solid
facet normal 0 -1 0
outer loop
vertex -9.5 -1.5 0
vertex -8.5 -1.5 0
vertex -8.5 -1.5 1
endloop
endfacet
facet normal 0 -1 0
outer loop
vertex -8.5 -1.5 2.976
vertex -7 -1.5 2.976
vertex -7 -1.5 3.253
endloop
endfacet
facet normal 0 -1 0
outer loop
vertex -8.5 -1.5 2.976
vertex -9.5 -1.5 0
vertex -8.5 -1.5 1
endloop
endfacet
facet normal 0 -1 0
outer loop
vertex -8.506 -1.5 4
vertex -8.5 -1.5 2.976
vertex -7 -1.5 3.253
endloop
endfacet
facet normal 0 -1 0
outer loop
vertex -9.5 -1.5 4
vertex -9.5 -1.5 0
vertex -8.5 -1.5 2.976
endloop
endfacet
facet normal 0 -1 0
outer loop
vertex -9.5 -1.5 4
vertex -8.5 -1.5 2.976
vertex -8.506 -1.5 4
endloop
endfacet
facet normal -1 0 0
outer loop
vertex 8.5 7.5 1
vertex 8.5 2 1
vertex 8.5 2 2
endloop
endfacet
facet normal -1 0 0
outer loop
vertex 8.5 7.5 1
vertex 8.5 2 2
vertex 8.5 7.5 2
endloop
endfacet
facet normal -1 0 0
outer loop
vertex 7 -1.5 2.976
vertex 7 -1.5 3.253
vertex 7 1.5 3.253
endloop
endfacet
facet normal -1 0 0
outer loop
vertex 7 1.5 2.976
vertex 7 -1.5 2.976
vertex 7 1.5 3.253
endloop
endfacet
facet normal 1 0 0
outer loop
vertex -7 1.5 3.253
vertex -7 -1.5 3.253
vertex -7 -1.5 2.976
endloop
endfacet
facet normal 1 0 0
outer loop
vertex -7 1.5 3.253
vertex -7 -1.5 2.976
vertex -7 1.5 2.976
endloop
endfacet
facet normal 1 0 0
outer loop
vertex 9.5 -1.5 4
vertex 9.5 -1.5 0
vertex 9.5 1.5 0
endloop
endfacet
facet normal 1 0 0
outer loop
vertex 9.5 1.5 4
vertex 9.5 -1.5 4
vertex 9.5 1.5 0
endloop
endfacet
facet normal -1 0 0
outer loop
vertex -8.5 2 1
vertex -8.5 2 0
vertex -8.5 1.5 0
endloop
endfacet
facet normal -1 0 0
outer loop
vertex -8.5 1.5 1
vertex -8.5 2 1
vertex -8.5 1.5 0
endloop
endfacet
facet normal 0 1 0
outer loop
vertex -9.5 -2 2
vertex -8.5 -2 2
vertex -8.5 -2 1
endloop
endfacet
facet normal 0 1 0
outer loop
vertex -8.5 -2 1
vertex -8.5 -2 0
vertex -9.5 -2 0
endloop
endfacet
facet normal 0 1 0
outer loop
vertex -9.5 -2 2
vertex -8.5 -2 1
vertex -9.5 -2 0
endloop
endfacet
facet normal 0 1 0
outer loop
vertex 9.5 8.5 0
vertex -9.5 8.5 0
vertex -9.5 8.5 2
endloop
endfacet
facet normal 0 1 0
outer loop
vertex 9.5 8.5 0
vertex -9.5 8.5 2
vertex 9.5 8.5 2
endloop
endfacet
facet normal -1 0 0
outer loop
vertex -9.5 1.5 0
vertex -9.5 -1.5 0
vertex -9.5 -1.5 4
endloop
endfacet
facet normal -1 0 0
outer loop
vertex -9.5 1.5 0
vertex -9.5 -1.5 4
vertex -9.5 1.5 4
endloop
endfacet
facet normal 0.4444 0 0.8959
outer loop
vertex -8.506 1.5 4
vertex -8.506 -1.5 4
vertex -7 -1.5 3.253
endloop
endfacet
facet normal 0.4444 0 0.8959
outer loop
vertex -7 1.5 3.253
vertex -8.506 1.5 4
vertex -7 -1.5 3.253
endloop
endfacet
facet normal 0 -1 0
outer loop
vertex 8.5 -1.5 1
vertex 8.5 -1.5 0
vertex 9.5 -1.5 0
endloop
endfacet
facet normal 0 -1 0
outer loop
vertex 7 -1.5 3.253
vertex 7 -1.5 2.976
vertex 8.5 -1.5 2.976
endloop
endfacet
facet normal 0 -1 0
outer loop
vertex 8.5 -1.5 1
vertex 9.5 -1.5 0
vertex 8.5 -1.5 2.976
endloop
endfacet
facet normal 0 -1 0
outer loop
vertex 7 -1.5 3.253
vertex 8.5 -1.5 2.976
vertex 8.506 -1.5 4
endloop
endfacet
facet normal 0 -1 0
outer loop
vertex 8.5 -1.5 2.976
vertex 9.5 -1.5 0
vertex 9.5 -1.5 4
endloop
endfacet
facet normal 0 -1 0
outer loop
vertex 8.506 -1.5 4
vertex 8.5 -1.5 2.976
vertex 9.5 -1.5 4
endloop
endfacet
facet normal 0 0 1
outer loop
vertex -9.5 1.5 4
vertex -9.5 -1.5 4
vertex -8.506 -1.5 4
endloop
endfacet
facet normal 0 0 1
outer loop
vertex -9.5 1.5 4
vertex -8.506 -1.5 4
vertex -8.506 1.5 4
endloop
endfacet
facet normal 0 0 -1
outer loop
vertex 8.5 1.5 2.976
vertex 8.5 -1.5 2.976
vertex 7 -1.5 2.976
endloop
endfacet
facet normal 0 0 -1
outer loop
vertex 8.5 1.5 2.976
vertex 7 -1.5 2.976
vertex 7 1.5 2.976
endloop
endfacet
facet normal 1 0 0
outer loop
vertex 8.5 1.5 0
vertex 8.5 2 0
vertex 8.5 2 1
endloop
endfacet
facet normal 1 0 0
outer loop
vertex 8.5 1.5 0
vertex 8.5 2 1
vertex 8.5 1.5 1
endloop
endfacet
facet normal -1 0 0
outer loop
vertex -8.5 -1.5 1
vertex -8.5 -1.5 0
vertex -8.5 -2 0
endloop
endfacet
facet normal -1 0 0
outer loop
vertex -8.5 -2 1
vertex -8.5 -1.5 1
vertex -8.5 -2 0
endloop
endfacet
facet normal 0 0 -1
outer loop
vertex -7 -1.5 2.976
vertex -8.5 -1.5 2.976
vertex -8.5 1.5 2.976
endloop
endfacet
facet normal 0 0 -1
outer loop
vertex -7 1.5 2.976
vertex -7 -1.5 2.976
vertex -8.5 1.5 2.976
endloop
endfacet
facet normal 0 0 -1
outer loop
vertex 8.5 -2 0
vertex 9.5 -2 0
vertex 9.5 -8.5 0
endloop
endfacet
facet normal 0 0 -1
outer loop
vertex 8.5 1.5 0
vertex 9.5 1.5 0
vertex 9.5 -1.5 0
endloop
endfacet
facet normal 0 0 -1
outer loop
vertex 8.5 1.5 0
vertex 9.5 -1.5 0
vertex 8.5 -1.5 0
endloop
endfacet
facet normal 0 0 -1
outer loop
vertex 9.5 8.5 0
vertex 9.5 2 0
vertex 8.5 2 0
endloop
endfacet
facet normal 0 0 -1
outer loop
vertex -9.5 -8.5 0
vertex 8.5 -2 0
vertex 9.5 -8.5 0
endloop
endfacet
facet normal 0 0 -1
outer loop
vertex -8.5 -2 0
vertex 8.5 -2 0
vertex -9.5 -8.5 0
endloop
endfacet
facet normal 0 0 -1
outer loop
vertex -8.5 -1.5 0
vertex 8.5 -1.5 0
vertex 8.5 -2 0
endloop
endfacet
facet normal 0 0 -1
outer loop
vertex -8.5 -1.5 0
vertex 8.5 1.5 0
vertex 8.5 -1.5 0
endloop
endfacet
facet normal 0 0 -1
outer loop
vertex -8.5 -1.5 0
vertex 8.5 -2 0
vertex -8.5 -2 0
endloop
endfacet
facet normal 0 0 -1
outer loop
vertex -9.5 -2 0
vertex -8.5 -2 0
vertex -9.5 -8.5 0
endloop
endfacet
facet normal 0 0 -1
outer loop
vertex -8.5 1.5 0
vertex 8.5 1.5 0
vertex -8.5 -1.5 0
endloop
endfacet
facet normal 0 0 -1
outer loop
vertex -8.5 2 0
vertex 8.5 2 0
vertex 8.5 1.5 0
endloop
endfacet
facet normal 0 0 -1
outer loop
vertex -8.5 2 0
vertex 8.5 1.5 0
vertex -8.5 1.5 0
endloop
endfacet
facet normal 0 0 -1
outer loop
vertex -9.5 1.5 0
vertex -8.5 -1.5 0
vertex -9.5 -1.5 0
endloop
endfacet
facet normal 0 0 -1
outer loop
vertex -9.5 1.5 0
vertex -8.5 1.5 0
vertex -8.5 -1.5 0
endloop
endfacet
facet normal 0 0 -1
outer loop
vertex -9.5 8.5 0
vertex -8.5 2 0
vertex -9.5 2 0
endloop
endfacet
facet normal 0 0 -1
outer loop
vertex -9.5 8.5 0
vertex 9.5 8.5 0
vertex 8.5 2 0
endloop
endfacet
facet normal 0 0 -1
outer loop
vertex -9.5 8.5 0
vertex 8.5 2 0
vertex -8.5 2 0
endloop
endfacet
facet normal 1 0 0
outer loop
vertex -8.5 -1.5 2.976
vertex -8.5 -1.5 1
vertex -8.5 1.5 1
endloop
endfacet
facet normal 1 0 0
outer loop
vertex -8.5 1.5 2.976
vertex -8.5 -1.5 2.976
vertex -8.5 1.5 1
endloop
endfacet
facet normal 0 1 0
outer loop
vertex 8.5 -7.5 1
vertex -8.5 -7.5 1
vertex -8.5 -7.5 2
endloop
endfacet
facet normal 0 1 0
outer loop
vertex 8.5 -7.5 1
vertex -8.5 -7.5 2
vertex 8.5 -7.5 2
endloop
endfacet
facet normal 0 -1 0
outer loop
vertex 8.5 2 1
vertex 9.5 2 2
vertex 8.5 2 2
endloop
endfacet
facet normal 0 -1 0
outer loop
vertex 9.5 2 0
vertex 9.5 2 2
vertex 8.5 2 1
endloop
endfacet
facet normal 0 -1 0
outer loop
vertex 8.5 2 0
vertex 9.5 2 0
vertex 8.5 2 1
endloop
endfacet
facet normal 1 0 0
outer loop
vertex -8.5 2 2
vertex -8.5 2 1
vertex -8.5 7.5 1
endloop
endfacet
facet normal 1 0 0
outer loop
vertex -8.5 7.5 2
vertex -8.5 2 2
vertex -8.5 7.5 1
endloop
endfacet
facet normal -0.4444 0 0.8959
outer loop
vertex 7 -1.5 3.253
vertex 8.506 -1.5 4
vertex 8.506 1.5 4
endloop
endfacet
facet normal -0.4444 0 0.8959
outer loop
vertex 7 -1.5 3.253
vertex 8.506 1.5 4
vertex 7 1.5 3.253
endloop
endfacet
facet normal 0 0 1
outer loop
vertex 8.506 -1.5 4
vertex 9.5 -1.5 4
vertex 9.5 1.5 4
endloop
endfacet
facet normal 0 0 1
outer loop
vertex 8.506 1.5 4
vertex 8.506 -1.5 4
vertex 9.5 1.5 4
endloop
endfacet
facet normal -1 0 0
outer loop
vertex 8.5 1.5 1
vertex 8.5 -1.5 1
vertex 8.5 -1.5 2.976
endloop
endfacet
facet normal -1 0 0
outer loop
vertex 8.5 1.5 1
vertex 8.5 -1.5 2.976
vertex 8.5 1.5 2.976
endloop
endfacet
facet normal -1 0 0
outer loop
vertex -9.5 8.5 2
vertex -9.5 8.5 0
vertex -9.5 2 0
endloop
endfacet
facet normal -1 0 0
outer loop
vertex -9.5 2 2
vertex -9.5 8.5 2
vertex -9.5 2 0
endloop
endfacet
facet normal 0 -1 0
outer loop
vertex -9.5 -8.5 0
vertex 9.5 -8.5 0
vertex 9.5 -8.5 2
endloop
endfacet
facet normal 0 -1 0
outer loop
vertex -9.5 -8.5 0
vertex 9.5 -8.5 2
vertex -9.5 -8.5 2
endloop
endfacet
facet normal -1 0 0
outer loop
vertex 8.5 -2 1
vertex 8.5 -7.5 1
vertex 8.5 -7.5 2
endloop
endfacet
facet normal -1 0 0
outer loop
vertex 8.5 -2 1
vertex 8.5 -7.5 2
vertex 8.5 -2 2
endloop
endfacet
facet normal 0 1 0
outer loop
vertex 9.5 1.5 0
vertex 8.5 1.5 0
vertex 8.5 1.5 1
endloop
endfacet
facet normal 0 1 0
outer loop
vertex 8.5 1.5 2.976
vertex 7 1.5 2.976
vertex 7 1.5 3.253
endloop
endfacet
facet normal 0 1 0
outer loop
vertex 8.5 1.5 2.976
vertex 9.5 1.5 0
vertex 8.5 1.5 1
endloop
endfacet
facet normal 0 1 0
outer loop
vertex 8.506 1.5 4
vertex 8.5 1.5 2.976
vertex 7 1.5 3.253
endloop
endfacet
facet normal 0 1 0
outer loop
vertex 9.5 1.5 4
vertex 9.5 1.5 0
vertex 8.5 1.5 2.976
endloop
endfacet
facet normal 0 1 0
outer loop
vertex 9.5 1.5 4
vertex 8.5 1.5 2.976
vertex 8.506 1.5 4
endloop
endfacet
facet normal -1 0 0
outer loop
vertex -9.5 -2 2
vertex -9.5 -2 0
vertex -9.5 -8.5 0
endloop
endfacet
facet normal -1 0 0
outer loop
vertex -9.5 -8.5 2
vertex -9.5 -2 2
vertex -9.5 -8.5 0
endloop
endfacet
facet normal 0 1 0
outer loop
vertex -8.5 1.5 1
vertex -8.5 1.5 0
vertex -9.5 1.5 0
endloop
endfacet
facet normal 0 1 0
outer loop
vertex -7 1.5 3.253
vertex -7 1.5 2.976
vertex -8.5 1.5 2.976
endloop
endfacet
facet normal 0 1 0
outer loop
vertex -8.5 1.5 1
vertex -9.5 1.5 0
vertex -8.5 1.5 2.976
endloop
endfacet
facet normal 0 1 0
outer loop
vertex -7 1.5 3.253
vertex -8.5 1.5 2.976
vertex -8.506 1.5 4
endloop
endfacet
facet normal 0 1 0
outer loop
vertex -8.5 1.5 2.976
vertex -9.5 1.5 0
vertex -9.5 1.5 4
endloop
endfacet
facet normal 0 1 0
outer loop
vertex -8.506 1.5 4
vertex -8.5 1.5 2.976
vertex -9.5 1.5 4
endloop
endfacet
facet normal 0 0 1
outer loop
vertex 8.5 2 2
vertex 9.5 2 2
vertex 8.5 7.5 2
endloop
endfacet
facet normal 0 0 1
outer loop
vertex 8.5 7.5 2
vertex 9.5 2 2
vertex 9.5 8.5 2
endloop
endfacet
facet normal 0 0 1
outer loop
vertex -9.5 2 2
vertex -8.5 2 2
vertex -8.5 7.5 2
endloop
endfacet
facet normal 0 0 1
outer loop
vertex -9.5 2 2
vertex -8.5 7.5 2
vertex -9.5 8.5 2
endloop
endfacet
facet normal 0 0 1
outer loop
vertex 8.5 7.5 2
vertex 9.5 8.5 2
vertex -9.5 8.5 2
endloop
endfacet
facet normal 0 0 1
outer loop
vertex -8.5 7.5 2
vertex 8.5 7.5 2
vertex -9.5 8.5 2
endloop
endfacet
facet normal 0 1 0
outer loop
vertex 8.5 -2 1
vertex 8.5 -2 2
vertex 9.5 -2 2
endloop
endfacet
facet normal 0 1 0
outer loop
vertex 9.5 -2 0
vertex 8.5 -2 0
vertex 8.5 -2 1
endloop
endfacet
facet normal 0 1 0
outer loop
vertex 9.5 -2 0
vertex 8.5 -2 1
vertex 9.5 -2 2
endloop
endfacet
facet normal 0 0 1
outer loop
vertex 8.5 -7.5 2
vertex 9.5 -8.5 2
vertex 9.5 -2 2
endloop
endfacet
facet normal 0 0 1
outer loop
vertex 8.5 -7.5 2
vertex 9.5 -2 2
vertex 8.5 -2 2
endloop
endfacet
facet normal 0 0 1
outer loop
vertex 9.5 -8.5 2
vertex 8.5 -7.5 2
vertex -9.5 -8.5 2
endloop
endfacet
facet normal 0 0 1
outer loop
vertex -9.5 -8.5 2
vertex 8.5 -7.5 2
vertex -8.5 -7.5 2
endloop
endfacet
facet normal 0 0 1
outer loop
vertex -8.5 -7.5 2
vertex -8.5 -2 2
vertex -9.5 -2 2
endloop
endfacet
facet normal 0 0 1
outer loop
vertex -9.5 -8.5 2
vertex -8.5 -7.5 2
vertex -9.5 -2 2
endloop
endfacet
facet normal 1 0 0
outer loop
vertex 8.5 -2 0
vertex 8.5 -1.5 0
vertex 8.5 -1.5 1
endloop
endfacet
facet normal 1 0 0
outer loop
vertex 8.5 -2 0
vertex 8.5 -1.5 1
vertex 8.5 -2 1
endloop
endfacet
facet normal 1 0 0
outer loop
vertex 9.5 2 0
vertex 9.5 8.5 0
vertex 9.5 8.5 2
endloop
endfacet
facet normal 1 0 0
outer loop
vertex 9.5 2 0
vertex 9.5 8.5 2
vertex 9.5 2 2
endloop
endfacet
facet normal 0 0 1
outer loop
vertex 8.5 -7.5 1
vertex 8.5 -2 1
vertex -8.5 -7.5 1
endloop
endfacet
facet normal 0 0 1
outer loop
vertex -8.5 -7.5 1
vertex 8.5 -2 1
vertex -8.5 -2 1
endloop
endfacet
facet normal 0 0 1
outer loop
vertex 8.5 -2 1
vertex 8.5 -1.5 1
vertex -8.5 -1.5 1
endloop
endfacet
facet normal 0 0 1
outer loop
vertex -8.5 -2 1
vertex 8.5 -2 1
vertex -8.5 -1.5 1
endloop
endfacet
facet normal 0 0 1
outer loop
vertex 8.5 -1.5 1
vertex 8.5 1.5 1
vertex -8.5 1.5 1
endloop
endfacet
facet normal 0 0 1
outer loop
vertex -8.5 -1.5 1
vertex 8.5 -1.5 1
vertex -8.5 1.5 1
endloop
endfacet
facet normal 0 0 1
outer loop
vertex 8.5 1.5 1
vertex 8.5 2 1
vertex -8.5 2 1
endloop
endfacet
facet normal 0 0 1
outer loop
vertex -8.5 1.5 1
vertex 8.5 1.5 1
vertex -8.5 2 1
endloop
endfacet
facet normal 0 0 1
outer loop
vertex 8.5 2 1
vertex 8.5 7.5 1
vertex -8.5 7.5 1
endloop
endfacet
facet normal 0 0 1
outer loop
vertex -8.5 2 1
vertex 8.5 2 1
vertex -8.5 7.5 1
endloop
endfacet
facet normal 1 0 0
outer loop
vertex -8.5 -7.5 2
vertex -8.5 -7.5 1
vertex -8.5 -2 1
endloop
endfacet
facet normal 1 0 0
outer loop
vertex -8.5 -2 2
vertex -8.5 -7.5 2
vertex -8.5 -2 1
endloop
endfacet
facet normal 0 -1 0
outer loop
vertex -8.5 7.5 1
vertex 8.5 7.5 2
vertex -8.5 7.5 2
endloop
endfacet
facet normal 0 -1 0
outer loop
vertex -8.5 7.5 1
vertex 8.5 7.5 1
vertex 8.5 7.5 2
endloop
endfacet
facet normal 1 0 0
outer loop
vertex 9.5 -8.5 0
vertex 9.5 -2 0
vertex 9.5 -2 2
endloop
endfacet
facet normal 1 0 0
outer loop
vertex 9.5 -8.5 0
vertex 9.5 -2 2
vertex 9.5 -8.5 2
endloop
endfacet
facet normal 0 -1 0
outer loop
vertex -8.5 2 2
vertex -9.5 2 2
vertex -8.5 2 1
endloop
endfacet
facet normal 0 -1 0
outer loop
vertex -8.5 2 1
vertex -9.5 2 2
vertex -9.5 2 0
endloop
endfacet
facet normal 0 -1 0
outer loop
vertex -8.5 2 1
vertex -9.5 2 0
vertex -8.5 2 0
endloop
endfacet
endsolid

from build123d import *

# Parameters (mm, degrees)
F1_DEPTH  = 1
F2_DEPTH  = 2
F0_W      = 1
F0_H      = 3
F3_DEPTH  = 4
F4_W      = 3
F4_H      = 1.0236278605
F5_DEPTH  = 1.5
F7_DEPTH  = 3
F9_DEPTH  = 2
F10_W     = 8.5
F10_H     = 15
F11_DEPTH = 2


# Not quite as in the source:
# - a feature names something its author has since deleted; it is built from what else it names


with BuildPart() as f1:
    # F0 (on Top) → F1 (new body)
    with BuildSketch(Plane.XY):
        Polygon((-8.5, 7.5), (-8.5, 2), (-8.5, 1.5), (-8.5, -1.5), (-8.5, -2), (-8.5, -7.5), (8.5, -7.5), (8.5, 7.5), align=None)
    extrude(amount=F1_DEPTH)

    # F0 (on Top) → F2 (join)
    with BuildSketch(Plane.XY):
        Polygon((9.5, 8.5), (-9.5, 8.5), (-9.5, 2), (-8.5, 2), (-8.5, 7.5), (8.5, 7.5), (8.5, -7.5), (-8.5, -7.5), (-8.5, -2), (-9.5, -2), (-9.5, -8.5), (9.5, -8.5), align=None)
    extrude(amount=F2_DEPTH)

    # F0 (on Top) → F3 (join)
    with BuildSketch(Plane.XY):
        with Locations((-9, 0)):
            Rectangle(F0_W, F0_H)
    extrude(amount=F3_DEPTH)

    # F4 (on face) → F5 (join)
    with BuildSketch(Plane.YZ.offset(-8.5)):
        with Locations((0, 3.4881860698)):
            Rectangle(F4_W, F4_H)
    extrude(amount=F5_DEPTH)

    # F6 (on face) → F7 (cut)
    with BuildSketch(Plane.XZ.offset(1.5)):
        Polygon((-8.5056265816, 4), (-7, 3.2529253513), (-7, 4), align=None)
    extrude(amount=-F7_DEPTH, mode=Mode.SUBTRACT)

    # F8 (on face) → F9 (cut)
    with BuildSketch(Plane.XY.offset(2)):
        Polygon((9.5, 8.5), (0, 8.5), (0, 7.5), (8.5, 7.5), (8.5, -7.5), (0, -7.5), (0, -8.5), (9.5, -8.5), align=None)
    extrude(amount=-F9_DEPTH, mode=Mode.SUBTRACT)

    # F10 (on face) → F11 (cut)
    with BuildSketch(Plane.XY.offset(1)):
        with Locations((4.25, 0)):
            Rectangle(F10_W, F10_H)
    extrude(amount=-F11_DEPTH, mode=Mode.SUBTRACT)

    # F12: F1 across plane


with BuildPart() as f1_1:
    add(f1.part)
    add(f1.part.mirror(Plane.YZ))


solid = f1_1.part
